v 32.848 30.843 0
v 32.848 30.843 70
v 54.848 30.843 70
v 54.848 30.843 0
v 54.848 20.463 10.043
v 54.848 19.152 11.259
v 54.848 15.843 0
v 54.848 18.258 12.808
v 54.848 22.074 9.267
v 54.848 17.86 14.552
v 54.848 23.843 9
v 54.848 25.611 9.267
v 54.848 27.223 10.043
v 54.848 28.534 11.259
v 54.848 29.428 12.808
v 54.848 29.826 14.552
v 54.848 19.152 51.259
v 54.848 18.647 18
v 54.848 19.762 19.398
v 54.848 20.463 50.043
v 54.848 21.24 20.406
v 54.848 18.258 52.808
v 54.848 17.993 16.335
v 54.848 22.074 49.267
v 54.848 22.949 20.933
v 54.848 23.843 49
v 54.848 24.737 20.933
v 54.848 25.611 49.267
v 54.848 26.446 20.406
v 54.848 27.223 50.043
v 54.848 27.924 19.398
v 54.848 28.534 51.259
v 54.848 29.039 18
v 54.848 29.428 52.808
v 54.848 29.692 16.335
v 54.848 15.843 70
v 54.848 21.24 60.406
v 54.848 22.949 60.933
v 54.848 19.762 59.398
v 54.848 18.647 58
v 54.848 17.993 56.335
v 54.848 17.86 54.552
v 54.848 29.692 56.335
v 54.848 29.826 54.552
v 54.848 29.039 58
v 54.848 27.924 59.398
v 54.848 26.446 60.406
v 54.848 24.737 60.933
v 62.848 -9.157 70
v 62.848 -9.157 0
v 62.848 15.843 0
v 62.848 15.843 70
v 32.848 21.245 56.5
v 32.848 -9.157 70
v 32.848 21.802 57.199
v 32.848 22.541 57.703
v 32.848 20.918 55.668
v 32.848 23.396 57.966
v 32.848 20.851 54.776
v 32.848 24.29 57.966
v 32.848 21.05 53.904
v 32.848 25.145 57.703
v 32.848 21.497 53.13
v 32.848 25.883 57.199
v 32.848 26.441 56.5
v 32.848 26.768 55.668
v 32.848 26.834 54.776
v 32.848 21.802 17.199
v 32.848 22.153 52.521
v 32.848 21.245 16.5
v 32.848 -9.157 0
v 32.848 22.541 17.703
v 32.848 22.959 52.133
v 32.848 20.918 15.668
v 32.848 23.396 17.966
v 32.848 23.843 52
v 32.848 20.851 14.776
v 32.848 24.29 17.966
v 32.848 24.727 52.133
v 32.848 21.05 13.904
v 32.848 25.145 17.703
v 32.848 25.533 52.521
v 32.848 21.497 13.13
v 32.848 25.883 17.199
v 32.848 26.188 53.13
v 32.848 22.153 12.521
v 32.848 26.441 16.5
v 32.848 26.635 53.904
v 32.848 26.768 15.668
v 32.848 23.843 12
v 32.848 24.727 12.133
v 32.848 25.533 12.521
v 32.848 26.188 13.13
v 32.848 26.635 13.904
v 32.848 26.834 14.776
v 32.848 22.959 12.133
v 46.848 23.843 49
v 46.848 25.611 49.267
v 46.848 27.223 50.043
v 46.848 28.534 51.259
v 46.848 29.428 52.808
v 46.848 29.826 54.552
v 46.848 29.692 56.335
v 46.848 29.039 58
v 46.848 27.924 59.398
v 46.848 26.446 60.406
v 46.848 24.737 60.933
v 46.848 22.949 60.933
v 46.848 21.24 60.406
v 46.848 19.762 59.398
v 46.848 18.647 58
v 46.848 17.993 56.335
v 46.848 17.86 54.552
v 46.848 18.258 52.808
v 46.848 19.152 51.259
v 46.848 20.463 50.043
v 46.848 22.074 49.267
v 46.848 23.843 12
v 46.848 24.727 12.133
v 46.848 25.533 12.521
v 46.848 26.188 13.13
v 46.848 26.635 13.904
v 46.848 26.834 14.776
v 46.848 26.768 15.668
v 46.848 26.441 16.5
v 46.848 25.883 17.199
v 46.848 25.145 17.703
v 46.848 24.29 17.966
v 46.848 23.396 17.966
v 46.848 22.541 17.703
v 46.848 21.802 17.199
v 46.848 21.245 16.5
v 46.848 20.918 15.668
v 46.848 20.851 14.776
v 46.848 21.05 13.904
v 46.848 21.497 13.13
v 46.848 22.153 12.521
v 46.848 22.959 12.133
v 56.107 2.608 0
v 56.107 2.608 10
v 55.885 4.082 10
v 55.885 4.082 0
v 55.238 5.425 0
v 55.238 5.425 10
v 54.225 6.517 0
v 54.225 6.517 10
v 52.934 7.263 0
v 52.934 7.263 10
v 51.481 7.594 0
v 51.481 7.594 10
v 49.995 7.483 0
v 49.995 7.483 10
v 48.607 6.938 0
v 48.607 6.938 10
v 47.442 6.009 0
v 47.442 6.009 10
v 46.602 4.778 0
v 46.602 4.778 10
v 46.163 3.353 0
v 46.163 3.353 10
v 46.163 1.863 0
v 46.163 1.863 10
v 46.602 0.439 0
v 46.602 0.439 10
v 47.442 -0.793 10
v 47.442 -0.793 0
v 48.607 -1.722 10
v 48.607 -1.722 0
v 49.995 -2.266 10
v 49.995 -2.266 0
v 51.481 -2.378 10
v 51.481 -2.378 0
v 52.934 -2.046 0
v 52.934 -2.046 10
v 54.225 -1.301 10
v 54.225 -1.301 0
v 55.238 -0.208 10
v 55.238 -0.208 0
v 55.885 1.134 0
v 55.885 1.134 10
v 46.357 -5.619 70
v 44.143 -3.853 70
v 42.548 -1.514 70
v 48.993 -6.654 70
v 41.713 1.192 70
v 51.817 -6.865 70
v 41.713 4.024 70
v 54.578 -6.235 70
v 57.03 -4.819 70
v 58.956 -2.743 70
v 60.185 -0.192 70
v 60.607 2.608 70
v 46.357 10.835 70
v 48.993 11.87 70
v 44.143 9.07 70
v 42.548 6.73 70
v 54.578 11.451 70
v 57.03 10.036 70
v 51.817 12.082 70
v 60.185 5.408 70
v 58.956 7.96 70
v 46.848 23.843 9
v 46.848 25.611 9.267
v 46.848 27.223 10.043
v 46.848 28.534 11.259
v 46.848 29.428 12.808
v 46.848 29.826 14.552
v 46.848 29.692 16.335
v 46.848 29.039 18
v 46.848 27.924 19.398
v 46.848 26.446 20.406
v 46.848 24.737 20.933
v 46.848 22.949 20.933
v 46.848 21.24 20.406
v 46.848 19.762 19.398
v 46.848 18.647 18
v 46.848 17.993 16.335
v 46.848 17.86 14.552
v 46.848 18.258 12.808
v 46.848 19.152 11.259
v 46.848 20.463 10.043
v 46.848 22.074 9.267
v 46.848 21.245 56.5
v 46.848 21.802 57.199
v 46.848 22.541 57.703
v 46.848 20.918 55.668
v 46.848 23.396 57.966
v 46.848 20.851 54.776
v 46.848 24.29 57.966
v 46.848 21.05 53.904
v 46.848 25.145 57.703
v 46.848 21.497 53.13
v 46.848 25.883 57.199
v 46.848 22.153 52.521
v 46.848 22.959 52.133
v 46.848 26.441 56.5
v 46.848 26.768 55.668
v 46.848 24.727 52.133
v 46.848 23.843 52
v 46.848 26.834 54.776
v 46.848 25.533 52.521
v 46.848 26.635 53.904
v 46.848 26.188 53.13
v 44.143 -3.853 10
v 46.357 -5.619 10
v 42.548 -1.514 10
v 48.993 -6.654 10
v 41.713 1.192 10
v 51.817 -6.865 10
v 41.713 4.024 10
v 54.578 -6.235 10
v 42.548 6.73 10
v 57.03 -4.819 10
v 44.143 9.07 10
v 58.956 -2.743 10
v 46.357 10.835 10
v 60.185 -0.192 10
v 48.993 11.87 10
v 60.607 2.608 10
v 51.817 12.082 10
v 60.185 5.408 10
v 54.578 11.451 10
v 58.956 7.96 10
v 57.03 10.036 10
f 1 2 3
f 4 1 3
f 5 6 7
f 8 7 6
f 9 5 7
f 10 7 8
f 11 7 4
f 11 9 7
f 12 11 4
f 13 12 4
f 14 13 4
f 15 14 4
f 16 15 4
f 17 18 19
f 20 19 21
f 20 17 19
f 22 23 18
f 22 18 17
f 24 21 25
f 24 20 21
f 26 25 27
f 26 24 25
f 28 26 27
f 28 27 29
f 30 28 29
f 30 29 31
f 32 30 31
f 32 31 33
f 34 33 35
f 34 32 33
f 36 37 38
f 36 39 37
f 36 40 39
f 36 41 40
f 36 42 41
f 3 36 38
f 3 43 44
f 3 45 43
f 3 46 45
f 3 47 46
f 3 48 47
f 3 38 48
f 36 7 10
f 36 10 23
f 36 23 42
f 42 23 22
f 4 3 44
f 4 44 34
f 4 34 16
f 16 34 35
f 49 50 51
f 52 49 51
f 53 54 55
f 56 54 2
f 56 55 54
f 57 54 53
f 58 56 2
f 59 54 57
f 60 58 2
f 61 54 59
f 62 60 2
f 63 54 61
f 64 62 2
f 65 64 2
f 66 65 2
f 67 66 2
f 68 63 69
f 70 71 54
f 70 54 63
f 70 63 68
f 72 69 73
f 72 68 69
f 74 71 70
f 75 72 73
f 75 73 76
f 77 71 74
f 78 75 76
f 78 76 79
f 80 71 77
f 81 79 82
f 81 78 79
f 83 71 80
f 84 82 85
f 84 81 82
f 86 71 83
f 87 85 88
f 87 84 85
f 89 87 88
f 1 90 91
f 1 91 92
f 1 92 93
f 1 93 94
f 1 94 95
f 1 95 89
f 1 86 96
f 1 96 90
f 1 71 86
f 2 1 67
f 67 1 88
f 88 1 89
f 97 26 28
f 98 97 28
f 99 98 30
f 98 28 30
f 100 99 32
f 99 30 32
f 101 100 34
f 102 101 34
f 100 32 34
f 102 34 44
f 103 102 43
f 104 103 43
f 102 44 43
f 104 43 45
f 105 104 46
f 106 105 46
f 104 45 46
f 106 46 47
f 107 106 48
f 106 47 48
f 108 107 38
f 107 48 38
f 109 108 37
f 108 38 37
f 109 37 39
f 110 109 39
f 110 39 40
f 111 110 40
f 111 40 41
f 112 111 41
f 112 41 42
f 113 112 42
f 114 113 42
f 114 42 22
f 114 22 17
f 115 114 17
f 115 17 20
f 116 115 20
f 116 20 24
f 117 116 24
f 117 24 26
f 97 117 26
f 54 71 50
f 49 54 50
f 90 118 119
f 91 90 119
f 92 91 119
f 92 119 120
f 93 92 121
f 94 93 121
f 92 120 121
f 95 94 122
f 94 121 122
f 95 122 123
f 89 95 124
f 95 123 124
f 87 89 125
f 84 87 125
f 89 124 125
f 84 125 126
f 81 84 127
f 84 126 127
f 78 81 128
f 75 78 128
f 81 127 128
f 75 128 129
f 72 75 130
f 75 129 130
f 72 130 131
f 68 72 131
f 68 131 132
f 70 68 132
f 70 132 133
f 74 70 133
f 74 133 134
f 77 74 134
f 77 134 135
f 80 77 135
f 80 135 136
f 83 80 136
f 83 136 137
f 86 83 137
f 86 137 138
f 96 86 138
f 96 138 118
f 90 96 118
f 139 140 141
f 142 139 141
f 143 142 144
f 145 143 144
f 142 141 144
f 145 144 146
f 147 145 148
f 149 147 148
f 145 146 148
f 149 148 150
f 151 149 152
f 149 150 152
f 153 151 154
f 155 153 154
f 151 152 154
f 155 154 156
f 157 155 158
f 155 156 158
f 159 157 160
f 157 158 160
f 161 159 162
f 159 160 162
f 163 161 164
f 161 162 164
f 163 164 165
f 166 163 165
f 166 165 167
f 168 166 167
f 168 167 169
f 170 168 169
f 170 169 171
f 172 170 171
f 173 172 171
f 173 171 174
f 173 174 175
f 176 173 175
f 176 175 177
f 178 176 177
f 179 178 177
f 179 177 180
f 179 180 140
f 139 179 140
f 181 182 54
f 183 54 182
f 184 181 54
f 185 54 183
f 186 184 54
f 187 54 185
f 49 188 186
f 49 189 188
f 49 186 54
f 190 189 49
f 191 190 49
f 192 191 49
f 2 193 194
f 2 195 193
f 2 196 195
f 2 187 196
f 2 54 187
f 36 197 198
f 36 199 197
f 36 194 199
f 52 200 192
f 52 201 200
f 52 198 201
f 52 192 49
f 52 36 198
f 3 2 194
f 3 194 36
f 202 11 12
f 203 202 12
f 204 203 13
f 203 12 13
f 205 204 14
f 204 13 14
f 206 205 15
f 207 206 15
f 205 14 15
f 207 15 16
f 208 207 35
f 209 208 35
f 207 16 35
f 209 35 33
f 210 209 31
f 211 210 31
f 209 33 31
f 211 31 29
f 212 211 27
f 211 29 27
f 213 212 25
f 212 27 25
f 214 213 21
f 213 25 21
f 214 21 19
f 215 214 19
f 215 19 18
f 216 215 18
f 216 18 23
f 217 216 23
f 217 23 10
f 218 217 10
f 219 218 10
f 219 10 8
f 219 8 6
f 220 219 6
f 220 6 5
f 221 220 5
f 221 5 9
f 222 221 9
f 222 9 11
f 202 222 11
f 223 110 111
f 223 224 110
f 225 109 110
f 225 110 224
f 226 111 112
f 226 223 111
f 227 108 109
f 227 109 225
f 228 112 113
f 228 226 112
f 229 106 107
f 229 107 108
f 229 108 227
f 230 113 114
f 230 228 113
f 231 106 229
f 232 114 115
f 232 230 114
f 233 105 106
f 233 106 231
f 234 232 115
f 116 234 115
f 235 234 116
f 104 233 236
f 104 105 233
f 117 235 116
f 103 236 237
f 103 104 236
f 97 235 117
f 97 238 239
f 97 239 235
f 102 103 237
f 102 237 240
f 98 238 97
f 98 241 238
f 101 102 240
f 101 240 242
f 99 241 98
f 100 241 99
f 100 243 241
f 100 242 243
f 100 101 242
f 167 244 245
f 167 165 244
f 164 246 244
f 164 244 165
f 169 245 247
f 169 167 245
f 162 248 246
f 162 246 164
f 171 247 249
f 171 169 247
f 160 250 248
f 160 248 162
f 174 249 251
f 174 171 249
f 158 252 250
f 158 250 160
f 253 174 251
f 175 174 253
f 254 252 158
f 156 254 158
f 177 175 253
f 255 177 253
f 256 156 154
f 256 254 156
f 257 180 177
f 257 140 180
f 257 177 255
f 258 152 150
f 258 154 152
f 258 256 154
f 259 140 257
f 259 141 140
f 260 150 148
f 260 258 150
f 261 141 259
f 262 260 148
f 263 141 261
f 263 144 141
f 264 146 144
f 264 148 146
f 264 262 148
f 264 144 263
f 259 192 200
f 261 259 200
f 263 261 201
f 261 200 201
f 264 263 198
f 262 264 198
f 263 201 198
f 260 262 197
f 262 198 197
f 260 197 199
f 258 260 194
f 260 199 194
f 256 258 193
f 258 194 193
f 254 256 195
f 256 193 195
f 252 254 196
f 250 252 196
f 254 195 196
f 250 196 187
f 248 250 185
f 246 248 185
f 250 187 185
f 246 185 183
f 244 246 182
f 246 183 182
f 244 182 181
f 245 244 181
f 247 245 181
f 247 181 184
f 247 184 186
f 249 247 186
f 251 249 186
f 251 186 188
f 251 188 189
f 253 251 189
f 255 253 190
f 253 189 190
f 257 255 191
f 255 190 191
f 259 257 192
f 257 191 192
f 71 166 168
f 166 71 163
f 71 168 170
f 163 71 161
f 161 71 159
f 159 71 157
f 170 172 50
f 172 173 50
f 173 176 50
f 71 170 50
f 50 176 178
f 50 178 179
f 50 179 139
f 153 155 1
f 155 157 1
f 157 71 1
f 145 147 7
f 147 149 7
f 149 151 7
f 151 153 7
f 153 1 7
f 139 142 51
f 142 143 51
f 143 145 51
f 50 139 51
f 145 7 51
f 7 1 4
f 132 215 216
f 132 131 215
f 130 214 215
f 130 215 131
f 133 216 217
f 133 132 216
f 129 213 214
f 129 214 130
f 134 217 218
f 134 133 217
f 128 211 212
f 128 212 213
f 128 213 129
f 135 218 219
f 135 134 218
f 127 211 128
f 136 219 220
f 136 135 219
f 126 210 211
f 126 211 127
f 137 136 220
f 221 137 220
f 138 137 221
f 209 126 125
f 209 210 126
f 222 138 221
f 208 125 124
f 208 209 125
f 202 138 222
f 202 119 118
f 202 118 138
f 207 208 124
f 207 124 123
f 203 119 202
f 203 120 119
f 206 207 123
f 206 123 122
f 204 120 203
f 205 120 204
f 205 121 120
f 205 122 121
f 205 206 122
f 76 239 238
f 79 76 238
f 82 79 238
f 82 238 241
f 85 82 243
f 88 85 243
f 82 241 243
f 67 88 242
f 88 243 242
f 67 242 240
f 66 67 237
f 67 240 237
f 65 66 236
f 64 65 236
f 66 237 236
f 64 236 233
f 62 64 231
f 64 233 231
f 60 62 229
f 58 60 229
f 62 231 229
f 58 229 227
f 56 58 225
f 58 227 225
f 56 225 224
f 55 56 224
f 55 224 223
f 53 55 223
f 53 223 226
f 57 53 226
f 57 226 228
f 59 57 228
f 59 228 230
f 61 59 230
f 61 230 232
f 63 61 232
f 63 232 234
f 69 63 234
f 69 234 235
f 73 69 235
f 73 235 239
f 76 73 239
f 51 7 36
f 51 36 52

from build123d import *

# Parameters (mm, degrees)
SKETCH_1_W          = 30
SKETCH_1_H          = 40
EXTRUDE_1_DEPTH     = 70
SKETCH_3_R          = 3
CUT_EXTRUDE_1_DEPTH = 70
SKETCH_4_R          = 6
CUT_EXTRUDE_2_DEPTH = 16
SKETCH_5_W          = 8
SKETCH_5_H          = 15
CUT_EXTRUDE_3_DEPTH = 75
SKETCH_2_R          = 9.5
CUT_EXTRUDE_4_DEPTH = 60
SKETCH_6_R          = 5
CUT_EXTRUDE_5_DEPTH = 50


with BuildPart() as part:
    # 草图1 → 凸台-拉伸1 (new body)
    with BuildSketch(Plane.XY):
        with Locations((47.847642857, 10.842857143)):
            Rectangle(SKETCH_1_W, SKETCH_1_H)
    extrude(amount=EXTRUDE_1_DEPTH)

    # 草图3 → 切除-拉伸1 (cut)
    with BuildSketch(Plane(origin=(62.847642857, 0, 0), x_dir=(0, 0, -1), z_dir=(1, 0, 0))):
        with Locations((-55, 23.842857143)):
            Circle(SKETCH_3_R)
        with Locations((-15, 23.842857143)):
            Circle(SKETCH_3_R)
    extrude(amount=-CUT_EXTRUDE_1_DEPTH, mode=Mode.SUBTRACT)

    # 草图4 → 切除-拉伸2 (cut)
    with BuildSketch(Plane(origin=(62.847642857, 0, 0), x_dir=(0, 0, -1), z_dir=(1, 0, 0))):
        with Locations((-55, 23.842857143)):
            Circle(SKETCH_4_R)
        with Locations((-15, 23.842857143)):
            Circle(SKETCH_4_R)
    extrude(amount=-CUT_EXTRUDE_2_DEPTH, mode=Mode.SUBTRACT)

    # 草图5 → 切除-拉伸3 (cut)
    with BuildSketch(Plane.XY.offset(70)):
        with Locations((58.847642857, 23.342857143)):
            Rectangle(SKETCH_5_W, SKETCH_5_H)
    extrude(amount=-CUT_EXTRUDE_3_DEPTH, mode=Mode.SUBTRACT)

    # 草图2 → 切除-拉伸4 (cut)
    with BuildSketch(Plane.XY.offset(70)):
        with Locations((51.107196317, 2.608195772)):
            Circle(SKETCH_2_R)
    extrude(amount=-CUT_EXTRUDE_4_DEPTH, mode=Mode.SUBTRACT)

    # 草图6 → 切除-拉伸5 (cut)
    with BuildSketch(Plane.XY.offset(10)):
        with Locations((51.107196317, 2.608195772)):
            Circle(SKETCH_6_R)
    extrude(amount=-CUT_EXTRUDE_5_DEPTH, mode=Mode.SUBTRACT)


solid = part.part
